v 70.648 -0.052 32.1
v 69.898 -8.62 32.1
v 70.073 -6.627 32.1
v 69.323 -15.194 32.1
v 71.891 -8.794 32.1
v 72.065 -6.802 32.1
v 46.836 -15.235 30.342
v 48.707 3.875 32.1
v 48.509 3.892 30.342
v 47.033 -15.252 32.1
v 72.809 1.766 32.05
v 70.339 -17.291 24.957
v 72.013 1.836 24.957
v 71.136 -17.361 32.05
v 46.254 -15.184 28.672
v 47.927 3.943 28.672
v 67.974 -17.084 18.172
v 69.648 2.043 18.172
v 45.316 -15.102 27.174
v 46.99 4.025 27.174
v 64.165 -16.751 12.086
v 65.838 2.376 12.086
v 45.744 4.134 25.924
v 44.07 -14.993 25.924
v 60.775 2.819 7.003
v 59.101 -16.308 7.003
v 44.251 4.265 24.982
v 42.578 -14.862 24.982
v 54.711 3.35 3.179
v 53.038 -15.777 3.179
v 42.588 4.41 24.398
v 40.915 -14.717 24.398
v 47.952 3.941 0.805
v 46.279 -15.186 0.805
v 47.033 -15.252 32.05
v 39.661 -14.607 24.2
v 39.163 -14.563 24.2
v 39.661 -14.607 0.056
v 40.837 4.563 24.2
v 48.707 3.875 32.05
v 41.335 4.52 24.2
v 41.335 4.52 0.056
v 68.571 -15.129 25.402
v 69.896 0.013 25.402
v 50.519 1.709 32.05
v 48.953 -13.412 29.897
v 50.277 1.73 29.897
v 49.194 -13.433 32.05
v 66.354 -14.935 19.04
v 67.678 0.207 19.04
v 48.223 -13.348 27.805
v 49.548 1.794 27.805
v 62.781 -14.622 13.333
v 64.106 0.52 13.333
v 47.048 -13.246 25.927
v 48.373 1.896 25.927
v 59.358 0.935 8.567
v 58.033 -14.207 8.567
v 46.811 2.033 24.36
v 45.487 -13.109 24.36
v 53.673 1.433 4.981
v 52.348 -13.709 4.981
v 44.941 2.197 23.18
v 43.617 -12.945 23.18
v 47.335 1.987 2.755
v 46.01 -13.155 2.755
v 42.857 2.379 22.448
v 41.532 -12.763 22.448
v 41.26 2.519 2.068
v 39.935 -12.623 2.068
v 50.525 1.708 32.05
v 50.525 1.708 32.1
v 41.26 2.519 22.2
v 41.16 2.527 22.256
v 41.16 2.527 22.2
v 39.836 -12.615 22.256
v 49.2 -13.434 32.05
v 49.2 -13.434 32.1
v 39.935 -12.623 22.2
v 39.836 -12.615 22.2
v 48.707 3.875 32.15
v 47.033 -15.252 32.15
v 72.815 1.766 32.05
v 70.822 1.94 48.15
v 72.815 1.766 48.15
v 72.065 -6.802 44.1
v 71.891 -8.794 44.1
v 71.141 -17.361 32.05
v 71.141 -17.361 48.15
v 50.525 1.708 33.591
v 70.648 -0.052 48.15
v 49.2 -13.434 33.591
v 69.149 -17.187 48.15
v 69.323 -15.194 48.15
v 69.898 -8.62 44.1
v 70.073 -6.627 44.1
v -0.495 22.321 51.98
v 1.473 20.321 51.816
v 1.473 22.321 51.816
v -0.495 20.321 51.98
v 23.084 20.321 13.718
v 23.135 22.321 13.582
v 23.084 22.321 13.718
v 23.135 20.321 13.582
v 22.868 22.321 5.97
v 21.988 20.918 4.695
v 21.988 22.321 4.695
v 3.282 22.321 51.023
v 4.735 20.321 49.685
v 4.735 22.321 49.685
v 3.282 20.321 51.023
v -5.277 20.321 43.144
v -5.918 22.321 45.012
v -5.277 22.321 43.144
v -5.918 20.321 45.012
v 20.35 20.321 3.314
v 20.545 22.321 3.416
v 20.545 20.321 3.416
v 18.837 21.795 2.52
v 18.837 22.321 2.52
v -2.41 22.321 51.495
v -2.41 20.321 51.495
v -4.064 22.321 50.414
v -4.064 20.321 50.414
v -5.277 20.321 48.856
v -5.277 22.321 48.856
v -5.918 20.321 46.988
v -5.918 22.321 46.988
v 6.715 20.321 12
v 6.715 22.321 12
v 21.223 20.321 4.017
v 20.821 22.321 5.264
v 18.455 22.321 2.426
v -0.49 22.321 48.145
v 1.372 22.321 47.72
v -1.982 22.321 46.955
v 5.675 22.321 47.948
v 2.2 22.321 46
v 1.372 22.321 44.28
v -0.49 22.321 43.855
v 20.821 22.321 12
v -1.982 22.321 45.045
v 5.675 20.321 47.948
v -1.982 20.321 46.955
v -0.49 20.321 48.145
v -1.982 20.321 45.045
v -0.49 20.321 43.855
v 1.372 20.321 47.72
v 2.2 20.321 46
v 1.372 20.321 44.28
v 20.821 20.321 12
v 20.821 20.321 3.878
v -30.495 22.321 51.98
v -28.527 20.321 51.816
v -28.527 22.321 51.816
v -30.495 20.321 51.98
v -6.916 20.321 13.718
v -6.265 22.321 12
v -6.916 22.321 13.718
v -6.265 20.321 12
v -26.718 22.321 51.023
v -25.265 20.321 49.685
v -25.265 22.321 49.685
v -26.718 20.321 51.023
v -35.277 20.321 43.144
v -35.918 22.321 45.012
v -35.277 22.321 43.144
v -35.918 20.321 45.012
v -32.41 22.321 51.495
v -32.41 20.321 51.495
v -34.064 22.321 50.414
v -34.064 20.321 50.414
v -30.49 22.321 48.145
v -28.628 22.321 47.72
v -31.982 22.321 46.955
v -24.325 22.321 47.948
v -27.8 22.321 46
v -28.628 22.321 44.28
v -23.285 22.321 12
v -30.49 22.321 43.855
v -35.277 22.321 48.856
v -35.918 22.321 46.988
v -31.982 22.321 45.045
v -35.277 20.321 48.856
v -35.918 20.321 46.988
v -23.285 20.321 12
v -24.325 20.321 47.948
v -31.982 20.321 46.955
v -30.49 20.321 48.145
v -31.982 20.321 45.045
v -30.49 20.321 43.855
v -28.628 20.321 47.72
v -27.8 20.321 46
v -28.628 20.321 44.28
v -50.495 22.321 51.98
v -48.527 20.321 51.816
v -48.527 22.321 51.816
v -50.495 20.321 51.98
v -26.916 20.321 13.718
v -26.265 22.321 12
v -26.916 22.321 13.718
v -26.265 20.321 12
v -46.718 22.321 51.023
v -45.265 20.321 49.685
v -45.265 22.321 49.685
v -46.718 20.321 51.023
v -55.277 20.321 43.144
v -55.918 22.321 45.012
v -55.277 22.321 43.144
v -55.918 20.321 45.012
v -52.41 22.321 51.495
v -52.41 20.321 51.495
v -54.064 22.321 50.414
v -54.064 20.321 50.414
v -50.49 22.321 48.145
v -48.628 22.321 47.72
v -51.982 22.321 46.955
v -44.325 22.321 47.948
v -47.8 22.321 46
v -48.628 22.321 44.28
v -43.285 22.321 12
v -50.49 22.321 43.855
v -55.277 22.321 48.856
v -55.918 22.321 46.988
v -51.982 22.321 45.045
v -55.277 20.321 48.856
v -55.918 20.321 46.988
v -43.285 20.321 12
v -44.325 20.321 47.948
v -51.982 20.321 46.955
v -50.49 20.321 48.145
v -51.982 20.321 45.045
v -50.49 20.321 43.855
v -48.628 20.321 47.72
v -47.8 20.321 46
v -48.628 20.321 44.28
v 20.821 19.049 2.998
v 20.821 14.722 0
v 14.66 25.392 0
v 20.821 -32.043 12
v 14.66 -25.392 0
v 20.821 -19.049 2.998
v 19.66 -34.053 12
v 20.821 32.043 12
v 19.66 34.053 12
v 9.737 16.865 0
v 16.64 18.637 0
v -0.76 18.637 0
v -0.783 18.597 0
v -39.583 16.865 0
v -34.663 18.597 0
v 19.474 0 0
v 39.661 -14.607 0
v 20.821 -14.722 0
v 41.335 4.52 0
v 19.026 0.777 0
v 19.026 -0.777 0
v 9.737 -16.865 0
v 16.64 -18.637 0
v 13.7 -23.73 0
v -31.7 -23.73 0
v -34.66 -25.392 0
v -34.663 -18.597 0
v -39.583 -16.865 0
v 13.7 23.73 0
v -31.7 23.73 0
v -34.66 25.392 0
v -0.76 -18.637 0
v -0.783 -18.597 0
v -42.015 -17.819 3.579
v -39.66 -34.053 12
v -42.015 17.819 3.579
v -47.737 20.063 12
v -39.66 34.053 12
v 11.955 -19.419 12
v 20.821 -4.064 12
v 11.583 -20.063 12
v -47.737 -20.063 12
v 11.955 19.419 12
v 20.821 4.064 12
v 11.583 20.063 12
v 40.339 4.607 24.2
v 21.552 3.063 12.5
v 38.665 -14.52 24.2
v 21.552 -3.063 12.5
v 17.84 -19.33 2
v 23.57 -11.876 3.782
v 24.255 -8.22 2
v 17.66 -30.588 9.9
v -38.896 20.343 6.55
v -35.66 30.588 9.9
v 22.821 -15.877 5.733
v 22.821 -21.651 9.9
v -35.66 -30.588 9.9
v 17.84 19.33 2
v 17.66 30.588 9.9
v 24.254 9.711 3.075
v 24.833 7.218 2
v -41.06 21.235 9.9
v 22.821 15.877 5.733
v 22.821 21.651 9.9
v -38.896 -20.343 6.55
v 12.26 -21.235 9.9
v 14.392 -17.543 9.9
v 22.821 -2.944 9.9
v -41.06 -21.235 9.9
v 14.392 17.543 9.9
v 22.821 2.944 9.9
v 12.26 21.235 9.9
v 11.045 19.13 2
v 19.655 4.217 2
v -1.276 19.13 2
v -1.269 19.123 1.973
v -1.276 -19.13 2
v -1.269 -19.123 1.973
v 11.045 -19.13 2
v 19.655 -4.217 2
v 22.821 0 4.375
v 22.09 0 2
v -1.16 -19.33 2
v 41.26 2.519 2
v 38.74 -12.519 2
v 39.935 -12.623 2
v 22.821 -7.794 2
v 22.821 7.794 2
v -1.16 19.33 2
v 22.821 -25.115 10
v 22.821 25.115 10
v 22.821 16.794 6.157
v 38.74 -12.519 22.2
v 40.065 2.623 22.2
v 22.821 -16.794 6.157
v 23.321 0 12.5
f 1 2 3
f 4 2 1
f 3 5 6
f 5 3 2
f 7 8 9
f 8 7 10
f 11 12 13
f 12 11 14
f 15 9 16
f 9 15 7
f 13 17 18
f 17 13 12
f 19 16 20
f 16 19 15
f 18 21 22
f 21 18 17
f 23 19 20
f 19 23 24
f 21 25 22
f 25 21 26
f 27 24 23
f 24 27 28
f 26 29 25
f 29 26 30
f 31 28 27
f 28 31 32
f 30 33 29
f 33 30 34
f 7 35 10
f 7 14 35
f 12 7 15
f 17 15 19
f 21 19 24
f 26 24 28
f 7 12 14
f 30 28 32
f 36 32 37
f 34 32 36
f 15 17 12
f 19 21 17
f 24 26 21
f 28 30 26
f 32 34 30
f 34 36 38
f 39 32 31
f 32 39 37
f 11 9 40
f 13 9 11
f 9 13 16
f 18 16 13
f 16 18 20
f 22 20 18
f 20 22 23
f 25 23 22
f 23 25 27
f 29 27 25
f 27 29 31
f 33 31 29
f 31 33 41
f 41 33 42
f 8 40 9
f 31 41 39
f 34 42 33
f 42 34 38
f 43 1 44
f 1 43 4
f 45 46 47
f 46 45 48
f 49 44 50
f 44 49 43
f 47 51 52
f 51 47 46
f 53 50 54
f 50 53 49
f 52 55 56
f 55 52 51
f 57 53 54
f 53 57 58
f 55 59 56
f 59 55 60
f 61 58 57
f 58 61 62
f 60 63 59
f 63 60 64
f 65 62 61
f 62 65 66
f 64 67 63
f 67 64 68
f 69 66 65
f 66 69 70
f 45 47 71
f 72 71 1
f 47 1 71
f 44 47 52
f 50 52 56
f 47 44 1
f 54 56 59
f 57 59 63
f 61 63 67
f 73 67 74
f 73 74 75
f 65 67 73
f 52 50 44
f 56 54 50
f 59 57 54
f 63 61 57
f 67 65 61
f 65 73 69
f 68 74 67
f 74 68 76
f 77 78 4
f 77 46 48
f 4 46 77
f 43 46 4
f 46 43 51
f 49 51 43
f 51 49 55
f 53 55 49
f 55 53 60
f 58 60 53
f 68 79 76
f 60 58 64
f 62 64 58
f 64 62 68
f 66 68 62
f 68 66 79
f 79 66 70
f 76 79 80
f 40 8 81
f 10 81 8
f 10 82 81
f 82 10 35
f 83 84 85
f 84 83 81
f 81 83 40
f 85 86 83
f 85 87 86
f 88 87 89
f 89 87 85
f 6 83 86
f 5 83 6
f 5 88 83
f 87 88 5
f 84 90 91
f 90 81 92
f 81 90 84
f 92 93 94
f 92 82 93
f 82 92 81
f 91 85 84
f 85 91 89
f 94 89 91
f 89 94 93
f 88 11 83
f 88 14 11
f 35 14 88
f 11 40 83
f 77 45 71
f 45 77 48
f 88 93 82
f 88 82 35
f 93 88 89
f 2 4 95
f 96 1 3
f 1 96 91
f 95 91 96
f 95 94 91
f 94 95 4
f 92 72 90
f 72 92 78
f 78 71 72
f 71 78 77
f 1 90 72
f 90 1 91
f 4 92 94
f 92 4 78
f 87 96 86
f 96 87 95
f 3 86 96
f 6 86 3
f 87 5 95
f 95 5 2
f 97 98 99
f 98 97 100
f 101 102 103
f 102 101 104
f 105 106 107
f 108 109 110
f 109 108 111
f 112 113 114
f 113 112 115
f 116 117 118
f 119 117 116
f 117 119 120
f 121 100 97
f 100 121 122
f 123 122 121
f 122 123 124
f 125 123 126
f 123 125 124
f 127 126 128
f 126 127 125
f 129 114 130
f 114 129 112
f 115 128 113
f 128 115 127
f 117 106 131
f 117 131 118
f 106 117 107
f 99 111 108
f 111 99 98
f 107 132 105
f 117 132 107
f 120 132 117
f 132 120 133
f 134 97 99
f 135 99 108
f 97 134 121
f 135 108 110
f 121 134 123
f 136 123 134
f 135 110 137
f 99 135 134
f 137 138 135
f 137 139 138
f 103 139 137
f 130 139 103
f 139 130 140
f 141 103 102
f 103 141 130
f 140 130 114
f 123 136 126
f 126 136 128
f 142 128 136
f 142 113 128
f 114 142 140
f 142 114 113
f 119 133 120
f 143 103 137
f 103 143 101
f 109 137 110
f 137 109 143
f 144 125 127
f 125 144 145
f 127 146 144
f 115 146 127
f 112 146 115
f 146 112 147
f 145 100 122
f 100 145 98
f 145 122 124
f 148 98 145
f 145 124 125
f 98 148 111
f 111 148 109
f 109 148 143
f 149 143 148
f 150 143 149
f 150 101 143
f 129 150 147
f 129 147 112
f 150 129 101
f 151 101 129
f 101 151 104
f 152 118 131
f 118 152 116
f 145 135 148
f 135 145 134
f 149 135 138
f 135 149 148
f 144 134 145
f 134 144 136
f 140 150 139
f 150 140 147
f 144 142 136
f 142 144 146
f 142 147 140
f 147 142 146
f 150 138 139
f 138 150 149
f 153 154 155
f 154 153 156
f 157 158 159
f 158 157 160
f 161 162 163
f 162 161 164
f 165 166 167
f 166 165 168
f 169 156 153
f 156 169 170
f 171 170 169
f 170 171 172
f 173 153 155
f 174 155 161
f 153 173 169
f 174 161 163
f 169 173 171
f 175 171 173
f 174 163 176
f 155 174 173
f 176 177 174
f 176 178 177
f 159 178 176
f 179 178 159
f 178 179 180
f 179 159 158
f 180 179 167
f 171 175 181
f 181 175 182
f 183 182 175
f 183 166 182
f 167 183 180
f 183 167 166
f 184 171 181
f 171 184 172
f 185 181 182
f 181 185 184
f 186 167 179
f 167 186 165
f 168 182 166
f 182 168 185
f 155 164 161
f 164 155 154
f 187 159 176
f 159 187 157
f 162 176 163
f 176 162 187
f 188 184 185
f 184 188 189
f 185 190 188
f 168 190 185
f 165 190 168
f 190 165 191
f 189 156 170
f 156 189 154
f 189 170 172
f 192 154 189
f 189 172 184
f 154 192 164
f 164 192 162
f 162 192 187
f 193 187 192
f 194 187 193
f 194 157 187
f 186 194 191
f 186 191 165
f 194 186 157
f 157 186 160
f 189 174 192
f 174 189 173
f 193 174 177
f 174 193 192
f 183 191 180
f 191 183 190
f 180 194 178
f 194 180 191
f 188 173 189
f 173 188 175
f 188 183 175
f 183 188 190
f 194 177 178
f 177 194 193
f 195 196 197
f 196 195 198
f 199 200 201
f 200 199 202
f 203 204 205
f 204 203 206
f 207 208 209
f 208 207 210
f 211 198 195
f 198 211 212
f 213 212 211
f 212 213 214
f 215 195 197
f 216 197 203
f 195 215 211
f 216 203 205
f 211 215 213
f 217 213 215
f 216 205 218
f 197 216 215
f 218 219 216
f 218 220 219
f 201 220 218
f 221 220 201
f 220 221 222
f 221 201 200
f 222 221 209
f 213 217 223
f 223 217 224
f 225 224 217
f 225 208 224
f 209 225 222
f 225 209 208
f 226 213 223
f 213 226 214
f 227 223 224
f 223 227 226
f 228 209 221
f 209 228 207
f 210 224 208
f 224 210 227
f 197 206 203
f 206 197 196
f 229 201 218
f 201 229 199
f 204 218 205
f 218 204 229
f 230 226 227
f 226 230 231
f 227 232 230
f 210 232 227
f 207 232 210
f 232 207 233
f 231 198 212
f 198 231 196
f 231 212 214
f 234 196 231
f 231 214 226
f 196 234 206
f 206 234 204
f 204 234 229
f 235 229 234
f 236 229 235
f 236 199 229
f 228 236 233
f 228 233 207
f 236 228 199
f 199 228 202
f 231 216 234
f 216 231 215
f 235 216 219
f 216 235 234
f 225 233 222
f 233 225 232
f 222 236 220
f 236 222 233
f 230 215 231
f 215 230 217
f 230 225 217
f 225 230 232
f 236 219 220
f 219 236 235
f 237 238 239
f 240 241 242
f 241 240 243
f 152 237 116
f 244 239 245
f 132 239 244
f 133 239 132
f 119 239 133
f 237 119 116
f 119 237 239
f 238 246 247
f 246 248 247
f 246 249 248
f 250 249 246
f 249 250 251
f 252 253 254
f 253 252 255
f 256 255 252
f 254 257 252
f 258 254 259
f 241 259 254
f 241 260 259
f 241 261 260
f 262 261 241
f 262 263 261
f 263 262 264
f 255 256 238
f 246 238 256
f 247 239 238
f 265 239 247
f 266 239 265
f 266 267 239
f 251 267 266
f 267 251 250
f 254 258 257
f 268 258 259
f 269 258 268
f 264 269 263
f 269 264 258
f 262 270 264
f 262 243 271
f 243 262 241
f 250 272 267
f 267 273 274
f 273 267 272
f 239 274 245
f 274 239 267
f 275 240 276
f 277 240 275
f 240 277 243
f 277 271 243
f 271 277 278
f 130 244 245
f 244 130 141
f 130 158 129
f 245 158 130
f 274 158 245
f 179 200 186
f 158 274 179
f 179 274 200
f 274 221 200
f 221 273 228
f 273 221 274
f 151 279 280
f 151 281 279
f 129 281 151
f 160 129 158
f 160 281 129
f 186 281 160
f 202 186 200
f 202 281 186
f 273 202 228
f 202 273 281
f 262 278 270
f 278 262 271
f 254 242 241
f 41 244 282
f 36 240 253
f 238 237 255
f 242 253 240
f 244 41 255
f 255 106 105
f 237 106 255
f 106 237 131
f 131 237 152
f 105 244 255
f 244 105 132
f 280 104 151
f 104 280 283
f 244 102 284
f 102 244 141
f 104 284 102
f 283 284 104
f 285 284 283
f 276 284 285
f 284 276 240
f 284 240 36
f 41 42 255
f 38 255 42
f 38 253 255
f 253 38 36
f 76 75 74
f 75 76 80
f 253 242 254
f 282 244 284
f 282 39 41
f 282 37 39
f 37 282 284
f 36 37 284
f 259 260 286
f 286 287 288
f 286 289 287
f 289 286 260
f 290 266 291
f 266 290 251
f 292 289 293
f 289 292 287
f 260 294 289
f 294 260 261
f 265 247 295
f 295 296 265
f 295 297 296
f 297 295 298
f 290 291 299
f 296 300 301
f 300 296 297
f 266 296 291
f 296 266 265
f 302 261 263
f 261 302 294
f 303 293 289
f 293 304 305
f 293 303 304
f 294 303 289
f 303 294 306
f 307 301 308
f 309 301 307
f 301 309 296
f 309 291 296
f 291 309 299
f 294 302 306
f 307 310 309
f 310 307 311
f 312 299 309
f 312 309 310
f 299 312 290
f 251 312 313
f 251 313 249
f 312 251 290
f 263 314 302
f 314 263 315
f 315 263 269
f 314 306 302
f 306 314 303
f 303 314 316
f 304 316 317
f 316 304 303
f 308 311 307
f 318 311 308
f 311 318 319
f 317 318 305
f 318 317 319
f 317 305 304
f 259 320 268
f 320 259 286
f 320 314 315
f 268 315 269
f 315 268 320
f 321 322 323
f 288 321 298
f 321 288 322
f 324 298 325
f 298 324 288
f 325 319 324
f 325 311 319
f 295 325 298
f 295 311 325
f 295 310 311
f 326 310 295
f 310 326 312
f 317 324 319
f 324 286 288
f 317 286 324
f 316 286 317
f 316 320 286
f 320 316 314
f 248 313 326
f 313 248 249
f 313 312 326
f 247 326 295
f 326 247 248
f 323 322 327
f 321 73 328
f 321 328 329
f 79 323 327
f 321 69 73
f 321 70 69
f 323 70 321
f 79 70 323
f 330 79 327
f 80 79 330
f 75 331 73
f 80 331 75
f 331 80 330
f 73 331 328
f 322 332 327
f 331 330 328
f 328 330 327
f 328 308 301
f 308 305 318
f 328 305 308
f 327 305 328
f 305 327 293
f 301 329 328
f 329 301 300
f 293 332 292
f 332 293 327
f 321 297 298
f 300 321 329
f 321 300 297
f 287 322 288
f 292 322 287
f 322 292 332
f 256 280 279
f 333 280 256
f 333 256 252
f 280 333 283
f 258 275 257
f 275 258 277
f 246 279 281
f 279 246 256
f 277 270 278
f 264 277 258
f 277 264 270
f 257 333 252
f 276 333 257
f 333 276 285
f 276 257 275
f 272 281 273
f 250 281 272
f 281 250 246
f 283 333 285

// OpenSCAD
hot_rad = 30/2/cos(30);
hotend_x=25;
fan_x = 15+5;

hotend_y=-5;

thickness = 10;
wall=2;
slop=.2;

fan_hole = (40-wall-wall)/2;
mount_drop = 10;
fan_z = fan_hole+wall;

//fan_mount();
bowden_fan();

%cylinder(r=hot_rad, h=20, center=true);
%translate([-23,0,0]) cylinder(r=hot_rad, h=20, center=true);

m3_cap_rad = 4;
m3_rad = 2;
m3_nut_rad = 6.01/2+.1;

facets = 6;

module fan_mount(){
    difference(){
        union(){
            //core
            cylinder(r1=hot_rad+thickness+wall, r2=hot_rad+thickness*2+wall, h=thickness+wall, $fn=facets);
            
            hull(){
                intersection(){
                    difference(){
                        cylinder(r1=hot_rad+thickness+wall, r2=hot_rad+thickness*2+wall, h=thickness+wall, $fn=facets);
                        translate([0,0,-.5]) cylinder(r1=hot_rad+wall, r2=hot_rad+wall+wall, h=thickness+wall+1, $fn=facets);
                    }
                    translate([50+hot_rad-6.7,50,50]) cube([100,100,100], center=true);
                }
                translate([hotend_x+fan_x-5,hotend_y,fan_z]) rotate([0,90,0]) cylinder(r=fan_hole+wall, h=5);
            }
            
            hull(){
                intersection(){
                    difference(){
                        cylinder(r1=hot_rad+thickness+wall, r2=hot_rad+thickness*2+wall, h=thickness+wall, $fn=facets);
                        translate([0,0,-.5]) cylinder(r1=hot_rad+wall, r2=hot_rad+wall+wall, h=thickness+wall+1, $fn=facets);
                    }
                    translate([50+hot_rad-6.7,-50,50]) cube([100,100,100], center=true);
                }
                translate([hotend_x+fan_x-5,hotend_y,fan_z]) rotate([0,90,0]) cylinder(r=fan_hole+wall, h=5);
            }
            
            //fan mount
            translate([hotend_x+fan_x,hotend_y,fan_z]) rotate([0,90,0]){
                hull() for(i=[0:90:359]) rotate([0,0,i]) {
                    #translate([20-wall,20-wall,-wall]) cylinder(r=wall,h=wall*2, $fn=16);
                }    
            }
            
            //mounting lugs above fan
            translate([hotend_x+fan_x,hotend_y,fan_z]) rotate([0,90,0]){
                for(i=[-16, 16]) difference(){
                    hull(){
                        translate([-16-mount_drop,i,-fan_x+3]) cylinder(r=m3_rad+wall, h=wall*2, $fn=16);
                        translate([0,i,-fan_x+3]) cylinder(r=m3_cap_rad*2, h=wall);
                    }
                    translate([-16-mount_drop,i,-fan_x+3-.1]) cylinder(r=m3_rad, h=wall*2+1, $fn=16);
                }
            }
        }
        
        //center cutout
        translate([0,0,-.5]) cylinder(r1=hot_rad+wall, r2=hot_rad+wall+wall, h=thickness+wall+1, $fn=facets);
                
        //front cutout
        translate([-(hot_rad+thickness*2+wall),0,0]) cylinder(r=hot_rad+thickness*2+wall, h=thickness+wall*10, center=true, $fn=facets);
        
        //fan holes
        translate([hotend_x+fan_x,hotend_y,fan_z]) rotate([0,90,0]){
            for(i=[-16, 16]) for(j=[-16, 16]) {
                #translate([j,i,-.1]) cylinder(r=m3_rad, h=wall+.2, $fn=16);
                translate([j,i,-wall*2-.1]) cylinder(r2=m3_nut_rad, r1=m3_nut_rad+.25, h=wall*2+.2, $fn=6);
            }
        }
        
        //air path
        translate([0,0,-.1]) difference(){
            union(){
                translate([-wall,0,0]) cylinder(r1=hot_rad+thickness, r2=hot_rad+thickness*2-wall, h=thickness, $fn=facets);
                
                hull(){
                    intersection(){
                        difference(){
                            translate([-wall,0,0]) cylinder(r1=hot_rad+thickness, r2=hot_rad+thickness*2-wall, h=thickness, $fn=facets);
                            translate([0,0,-.5]) cylinder(r1=hot_rad+wall*2, r2=hot_rad+wall*3, h=thickness+wall+1, $fn=facets);
                        }
                        translate([50+hot_rad-6.7,50,50]) cube([100,100,100], center=true);
                    }
                    translate([hotend_x+fan_x-5,hotend_y,fan_z]) rotate([0,90,0]) cylinder(r=fan_hole, h=.3);
                }
                
                hull(){
                    intersection(){
                        difference(){
                            translate([-wall,0,0]) cylinder(r1=hot_rad+thickness, r2=hot_rad+thickness*2-wall, h=thickness, $fn=facets);
                            translate([0,0,-.5]) cylinder(r1=hot_rad+wall+wall, r2=hot_rad+wall+wall+wall, h=thickness+wall+1, $fn=facets);
                        }
                        translate([50+hot_rad-6.7,-50,50]) cube([100,100,100], center=true);
                    }
                    translate([hotend_x+fan_x-5,hotend_y,fan_z]) rotate([0,90,0]) cylinder(r=fan_hole, h=.3);
                }
                
                translate([hotend_x+fan_x-5,hotend_y,fan_z]) rotate([0,90,0]) cylinder(r=fan_hole, h=wall+1+5);
            }
            cylinder(r1=hot_rad+wall+wall, r2=hot_rad+wall+wall+wall, h=thickness+wall, $fn=facets);
            translate([-(hot_rad+thickness*2),0,0]) cylinder(r=hot_rad+thickness*2+wall, h=thickness+wall*10, center=true, $fn=facets);
            translate([0,-5+hotend_y/2,0])cube([100,10,wall]);
        }
    }
}

duct_angle=-5;
duct_jut = -5;

module bowden_fan(){
    duct_w = 15+slop;
    duct_h = 20+slop;
    duct_offset=40;
    
    mount_height = 46;
    
    offset = -20;
    difference(){
        union(){
            //core
            hull(){
                cylinder(r1=hot_rad+thickness+wall, r2=hot_rad+thickness*2+wall, h=thickness+wall, $fn=facets);
                translate([offset,0,0]) cylinder(r1=hot_rad+thickness+wall, r2=hot_rad+thickness*2+wall, h=thickness+wall, $fn=facets);
            }
            
            //connection to duct
            hull(){
                intersection(){
                    cylinder(r1=hot_rad+thickness+wall, r2=hot_rad+thickness*2+wall, h=thickness+wall, $fn=facets);
                    translate([hot_rad+wall*2,0,0]) cube([1,200,200], center=true);
                }
                translate([duct_offset,duct_jut,duct_h/2+wall]) rotate([0,0,duct_angle]) cube([1,duct_w+wall*2, duct_h+wall*2], center=true);
            }
            
            //the duct connector
            translate([duct_offset,duct_jut,0]) rotate([0,0,duct_angle]) duct();
            
            //mounting lugs
            for(i=[0,-30,-50]) difference(){
                translate([i,hot_rad+wall*2,0]) hull(){
                    translate([16,0,thickness]) rotate([90,0,0]) cylinder(r=m3_cap_rad+wall*2, h=wall, center=true);
                    translate([0,0,mount_height]) rotate([90,0,0]) cylinder(r=m3_cap_rad+wall, h=wall, center=true);
                }
                
                //mounting holes up top
                translate([i,hot_rad+wall*2,mount_height]) rotate([90,0,0]) cylinder(r=m3_rad+slop, h=20, center=true);
            }
        }
        
        //connection to duct airflow
        hull(){
            intersection(){
                translate([0,0,wall]) cylinder(r1=hot_rad+thickness, r2=hot_rad+thickness*2, h=thickness-wall, $fn=facets);
                translate([hot_rad+wall*3,0,0]) cube([1,200,200], center=true);
            }
            translate([duct_offset,duct_jut,duct_h/2+wall]) rotate([0,0,duct_angle]) cube([1.2,duct_w, duct_h], center=true);
        }
        
        //center cutout
        translate([0,0,-.5]) hull(){
            cylinder(r1=hot_rad+wall, r2=hot_rad+wall*3, h=thickness+wall+1, $fn=facets);
            translate([2*offset,0,0]) cylinder(r1=hot_rad+wall, r2=hot_rad+wall*3, h=thickness+wall+1, $fn=facets);
        }
        
        //air path
        difference(){
            //core
            translate([0,0,-.1]) hull(){
                cylinder(r1=hot_rad+thickness, r2=hot_rad+thickness*2-wall, h=thickness, $fn=facets);
                translate([offset+wall,0,0]) cylinder(r1=hot_rad+thickness, r2=hot_rad+thickness*2-wall, h=thickness, $fn=facets);
            }
            
            //keep the center walls in place
            translate([0,0,-.5]) hull(){
                cylinder(r1=hot_rad+wall*2, r2=hot_rad+wall*4, h=thickness+wall+1, $fn=facets);
                translate([2*offset,0,0]) cylinder(r1=hot_rad+wall*2, r2=hot_rad+wall*4, h=thickness+wall+1, $fn=facets);
            }
            
            //bottom on the near side
            translate([10,0,-.5]) cylinder(r1=hot_rad+wall*2, r2=hot_rad+wall*2.5, h=wall+.5, $fn=facets);
        }
    }
}

module duct(){
    duct_w = 15+slop;
    duct_h = 20+slop;
    rad = 20;
    
    translate([0,0,rad+wall+duct_h/2]) rotate([-90,0,0]) union(){
        intersection(){
            rotate_extrude(angle = 90, convexity = 2){
                translate([rad,0,0])
                difference(){
                    square([duct_h+wall*2, duct_w+wall*2], center=true);
                    square([duct_h, duct_w], center=true);
                }
            }
            translate([0,0,-100]) cube([200,200,200]);
        }
        
        translate([rad,0,0]) rotate([90,0,0]) translate([0,0,8]) difference(){
            hull(){
                translate([0,0,-8]) cube([duct_h+wall*2,duct_w+wall*2,.1], center=true);
                #translate([duct_h/2+wall/2,0,8]) cube([wall,duct_w+wall*2,.1], center=true);
            }
            
            //hollow center
            cube([duct_h,duct_w,16.3], center=true);
            
            //slot for the clip
            translate([wall+1,0,(12-16)/2]) cube([duct_h+wall*2,2,12], center=true);
        }
        
    }
    
}
